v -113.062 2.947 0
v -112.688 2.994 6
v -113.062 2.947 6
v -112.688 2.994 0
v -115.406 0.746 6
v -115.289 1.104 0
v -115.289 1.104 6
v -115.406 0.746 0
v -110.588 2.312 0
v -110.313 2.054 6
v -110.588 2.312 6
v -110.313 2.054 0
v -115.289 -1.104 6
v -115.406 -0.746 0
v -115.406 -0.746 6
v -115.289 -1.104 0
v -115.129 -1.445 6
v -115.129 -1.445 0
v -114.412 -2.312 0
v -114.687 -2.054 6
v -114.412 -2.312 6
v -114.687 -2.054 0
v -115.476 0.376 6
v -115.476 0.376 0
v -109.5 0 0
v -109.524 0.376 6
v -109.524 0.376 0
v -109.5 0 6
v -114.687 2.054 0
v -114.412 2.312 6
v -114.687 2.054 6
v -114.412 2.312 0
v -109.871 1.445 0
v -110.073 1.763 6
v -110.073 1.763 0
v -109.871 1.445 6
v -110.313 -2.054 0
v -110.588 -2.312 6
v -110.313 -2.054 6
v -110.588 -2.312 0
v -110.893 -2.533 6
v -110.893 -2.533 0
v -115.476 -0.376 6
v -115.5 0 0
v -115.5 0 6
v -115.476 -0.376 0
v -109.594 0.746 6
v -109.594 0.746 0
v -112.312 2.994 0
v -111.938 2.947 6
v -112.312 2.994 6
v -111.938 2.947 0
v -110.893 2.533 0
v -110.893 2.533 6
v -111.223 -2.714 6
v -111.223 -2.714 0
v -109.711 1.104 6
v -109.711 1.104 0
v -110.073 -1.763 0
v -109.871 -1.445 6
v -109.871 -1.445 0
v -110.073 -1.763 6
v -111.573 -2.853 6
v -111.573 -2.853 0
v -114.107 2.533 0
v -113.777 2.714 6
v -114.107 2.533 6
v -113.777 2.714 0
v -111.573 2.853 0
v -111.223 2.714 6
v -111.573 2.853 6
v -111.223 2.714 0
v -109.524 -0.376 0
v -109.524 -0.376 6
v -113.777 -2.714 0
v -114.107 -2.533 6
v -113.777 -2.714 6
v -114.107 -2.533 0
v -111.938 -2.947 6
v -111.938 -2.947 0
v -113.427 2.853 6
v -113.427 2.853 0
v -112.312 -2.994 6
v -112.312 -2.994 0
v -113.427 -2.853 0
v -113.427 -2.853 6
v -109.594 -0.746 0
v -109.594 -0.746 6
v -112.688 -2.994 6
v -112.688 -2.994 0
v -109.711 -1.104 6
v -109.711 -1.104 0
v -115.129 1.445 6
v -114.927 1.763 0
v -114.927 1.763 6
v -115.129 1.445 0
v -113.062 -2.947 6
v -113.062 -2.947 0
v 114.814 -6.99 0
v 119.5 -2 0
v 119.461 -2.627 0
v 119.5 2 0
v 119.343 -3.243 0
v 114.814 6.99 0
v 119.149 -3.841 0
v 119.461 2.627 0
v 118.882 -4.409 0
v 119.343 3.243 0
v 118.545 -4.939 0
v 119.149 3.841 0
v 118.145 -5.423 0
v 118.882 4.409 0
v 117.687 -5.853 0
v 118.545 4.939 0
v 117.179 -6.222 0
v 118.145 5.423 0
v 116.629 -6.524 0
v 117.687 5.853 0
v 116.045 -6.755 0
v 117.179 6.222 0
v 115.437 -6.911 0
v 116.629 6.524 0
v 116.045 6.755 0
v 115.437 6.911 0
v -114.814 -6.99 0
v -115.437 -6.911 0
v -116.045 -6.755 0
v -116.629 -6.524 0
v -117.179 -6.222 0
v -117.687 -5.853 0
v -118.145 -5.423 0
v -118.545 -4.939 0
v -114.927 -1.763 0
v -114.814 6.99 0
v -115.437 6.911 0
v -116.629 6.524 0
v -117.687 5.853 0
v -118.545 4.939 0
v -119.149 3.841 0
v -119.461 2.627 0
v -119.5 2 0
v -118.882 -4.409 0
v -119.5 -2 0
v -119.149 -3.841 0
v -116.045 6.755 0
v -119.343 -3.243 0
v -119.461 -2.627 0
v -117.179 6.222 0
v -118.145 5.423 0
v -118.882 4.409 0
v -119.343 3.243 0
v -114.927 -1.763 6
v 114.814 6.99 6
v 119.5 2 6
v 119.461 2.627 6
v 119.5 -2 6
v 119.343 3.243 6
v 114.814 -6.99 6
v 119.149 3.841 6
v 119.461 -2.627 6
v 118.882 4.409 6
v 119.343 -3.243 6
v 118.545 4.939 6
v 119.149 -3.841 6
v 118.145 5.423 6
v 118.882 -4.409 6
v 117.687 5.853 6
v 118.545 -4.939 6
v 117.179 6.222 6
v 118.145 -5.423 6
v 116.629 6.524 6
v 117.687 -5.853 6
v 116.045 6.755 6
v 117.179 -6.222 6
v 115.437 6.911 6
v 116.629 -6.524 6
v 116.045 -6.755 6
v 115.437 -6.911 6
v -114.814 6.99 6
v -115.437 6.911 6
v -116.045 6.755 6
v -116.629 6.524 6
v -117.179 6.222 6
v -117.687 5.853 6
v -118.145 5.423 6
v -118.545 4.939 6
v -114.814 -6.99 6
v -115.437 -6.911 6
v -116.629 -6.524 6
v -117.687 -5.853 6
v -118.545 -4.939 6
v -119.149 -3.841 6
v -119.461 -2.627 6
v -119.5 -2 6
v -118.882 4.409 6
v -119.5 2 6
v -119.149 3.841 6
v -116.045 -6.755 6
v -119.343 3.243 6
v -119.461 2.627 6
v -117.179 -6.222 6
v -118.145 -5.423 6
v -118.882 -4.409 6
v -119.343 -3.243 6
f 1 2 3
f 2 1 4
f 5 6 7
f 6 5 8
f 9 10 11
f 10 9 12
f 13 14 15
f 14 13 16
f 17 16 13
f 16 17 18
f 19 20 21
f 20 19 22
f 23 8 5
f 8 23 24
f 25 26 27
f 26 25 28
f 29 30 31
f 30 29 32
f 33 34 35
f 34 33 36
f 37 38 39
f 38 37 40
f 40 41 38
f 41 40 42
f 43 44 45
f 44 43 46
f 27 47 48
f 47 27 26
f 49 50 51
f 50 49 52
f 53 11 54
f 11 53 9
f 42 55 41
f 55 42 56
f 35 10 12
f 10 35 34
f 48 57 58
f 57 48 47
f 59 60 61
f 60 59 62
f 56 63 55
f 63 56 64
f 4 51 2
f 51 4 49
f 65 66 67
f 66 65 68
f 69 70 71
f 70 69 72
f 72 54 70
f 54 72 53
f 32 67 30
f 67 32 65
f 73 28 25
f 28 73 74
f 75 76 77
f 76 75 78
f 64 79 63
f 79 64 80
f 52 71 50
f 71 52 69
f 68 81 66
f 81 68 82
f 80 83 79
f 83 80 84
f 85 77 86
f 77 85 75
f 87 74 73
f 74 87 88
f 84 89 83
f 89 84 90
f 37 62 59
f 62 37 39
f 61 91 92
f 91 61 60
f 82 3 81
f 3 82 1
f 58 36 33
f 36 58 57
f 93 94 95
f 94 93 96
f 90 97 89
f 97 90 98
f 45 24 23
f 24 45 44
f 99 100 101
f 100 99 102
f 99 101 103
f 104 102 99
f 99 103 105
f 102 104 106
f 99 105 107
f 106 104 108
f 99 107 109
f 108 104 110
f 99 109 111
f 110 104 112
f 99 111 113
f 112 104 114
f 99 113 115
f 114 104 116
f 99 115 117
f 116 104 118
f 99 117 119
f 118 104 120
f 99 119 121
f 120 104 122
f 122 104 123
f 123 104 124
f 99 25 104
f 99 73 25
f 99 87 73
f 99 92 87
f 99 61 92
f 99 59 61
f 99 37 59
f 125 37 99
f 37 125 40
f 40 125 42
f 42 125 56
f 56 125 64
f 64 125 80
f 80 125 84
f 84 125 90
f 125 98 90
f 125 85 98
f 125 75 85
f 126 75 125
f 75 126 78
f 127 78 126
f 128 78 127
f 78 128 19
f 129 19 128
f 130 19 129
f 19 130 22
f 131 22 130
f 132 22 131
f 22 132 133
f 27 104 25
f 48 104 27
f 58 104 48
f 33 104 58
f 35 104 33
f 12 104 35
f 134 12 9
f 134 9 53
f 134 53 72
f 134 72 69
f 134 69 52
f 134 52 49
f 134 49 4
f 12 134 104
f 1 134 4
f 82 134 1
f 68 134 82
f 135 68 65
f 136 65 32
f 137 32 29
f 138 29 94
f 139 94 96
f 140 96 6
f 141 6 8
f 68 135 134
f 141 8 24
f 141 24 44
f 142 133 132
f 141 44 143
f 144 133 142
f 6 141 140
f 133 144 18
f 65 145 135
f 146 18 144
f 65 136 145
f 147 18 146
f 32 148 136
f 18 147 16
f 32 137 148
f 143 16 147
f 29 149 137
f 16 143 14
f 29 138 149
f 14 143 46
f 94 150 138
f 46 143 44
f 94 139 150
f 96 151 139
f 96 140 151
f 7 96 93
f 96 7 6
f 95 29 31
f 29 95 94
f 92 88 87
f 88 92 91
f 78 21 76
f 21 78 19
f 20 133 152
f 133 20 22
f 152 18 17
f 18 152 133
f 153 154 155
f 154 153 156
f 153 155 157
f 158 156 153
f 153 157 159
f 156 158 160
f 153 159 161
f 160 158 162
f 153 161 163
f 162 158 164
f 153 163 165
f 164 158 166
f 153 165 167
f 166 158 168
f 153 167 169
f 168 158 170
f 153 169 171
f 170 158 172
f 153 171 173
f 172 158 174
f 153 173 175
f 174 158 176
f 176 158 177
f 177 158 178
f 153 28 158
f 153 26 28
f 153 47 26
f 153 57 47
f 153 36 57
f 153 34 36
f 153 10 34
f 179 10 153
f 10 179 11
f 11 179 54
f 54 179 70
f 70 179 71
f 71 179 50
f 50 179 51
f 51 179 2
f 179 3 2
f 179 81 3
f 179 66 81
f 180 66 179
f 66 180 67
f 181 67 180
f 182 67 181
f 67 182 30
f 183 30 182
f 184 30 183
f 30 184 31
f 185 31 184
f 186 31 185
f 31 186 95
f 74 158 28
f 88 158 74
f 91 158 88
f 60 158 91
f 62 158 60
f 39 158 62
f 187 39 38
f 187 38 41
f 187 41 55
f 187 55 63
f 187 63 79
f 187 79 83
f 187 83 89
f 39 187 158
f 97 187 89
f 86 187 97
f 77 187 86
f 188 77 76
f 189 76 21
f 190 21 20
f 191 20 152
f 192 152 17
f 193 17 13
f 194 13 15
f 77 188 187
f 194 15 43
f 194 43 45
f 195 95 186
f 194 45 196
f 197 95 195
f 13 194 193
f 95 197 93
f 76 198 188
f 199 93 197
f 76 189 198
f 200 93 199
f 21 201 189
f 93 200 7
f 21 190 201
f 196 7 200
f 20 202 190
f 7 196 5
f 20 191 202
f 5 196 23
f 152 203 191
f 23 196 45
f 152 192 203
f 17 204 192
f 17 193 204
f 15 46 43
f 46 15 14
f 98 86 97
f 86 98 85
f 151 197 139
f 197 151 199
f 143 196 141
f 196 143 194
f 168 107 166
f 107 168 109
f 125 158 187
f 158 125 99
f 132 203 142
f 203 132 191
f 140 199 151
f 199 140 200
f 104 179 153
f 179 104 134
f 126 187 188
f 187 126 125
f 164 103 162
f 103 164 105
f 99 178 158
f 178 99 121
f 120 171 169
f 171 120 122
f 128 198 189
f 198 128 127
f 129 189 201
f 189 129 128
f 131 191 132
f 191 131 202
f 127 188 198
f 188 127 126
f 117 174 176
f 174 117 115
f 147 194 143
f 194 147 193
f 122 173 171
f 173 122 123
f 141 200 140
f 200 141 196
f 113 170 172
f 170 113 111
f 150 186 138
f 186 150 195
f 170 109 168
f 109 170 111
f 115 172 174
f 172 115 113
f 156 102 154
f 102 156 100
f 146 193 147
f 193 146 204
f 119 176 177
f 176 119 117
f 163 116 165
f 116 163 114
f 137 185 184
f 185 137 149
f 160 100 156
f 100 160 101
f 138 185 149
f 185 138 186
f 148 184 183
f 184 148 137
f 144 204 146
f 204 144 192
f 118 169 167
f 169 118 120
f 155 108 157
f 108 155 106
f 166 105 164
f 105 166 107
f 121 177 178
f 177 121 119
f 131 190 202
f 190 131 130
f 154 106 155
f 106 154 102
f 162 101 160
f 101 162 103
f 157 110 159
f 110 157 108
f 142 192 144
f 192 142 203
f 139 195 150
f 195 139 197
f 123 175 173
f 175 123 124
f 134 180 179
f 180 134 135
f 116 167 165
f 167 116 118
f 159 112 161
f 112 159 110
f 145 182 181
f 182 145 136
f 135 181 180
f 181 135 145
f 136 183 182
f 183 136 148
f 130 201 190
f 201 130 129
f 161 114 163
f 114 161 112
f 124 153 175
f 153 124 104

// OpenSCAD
$fn = 50;


difference() {
	union() {
		hull() {
			translate(v = [-114.5000000000, 2.0000000000, 0]) {
				cylinder(h = 6, r = 5);
			}
			translate(v = [114.5000000000, 2.0000000000, 0]) {
				cylinder(h = 6, r = 5);
			}
			translate(v = [-114.5000000000, -2.0000000000, 0]) {
				cylinder(h = 6, r = 5);
			}
			translate(v = [114.5000000000, -2.0000000000, 0]) {
				cylinder(h = 6, r = 5);
			}
		}
	}
	union() {
		translate(v = [-112.5000000000, 0.0000000000, 0]) {
			cylinder(h = 6, r = 3.0000000000);
		}
		translate(v = [-112.5000000000, 0.0000000000, 0]) {
			cylinder(h = 6, r = 1.5000000000);
		}
		translate(v = [-112.5000000000, 0.0000000000, 0]) {
			cylinder(h = 6, r = 1.5000000000);
		}
		translate(v = [-112.5000000000, 0.0000000000, 0]) {
			cylinder(h = 6, r = 1.5000000000);
		}
	}
}
